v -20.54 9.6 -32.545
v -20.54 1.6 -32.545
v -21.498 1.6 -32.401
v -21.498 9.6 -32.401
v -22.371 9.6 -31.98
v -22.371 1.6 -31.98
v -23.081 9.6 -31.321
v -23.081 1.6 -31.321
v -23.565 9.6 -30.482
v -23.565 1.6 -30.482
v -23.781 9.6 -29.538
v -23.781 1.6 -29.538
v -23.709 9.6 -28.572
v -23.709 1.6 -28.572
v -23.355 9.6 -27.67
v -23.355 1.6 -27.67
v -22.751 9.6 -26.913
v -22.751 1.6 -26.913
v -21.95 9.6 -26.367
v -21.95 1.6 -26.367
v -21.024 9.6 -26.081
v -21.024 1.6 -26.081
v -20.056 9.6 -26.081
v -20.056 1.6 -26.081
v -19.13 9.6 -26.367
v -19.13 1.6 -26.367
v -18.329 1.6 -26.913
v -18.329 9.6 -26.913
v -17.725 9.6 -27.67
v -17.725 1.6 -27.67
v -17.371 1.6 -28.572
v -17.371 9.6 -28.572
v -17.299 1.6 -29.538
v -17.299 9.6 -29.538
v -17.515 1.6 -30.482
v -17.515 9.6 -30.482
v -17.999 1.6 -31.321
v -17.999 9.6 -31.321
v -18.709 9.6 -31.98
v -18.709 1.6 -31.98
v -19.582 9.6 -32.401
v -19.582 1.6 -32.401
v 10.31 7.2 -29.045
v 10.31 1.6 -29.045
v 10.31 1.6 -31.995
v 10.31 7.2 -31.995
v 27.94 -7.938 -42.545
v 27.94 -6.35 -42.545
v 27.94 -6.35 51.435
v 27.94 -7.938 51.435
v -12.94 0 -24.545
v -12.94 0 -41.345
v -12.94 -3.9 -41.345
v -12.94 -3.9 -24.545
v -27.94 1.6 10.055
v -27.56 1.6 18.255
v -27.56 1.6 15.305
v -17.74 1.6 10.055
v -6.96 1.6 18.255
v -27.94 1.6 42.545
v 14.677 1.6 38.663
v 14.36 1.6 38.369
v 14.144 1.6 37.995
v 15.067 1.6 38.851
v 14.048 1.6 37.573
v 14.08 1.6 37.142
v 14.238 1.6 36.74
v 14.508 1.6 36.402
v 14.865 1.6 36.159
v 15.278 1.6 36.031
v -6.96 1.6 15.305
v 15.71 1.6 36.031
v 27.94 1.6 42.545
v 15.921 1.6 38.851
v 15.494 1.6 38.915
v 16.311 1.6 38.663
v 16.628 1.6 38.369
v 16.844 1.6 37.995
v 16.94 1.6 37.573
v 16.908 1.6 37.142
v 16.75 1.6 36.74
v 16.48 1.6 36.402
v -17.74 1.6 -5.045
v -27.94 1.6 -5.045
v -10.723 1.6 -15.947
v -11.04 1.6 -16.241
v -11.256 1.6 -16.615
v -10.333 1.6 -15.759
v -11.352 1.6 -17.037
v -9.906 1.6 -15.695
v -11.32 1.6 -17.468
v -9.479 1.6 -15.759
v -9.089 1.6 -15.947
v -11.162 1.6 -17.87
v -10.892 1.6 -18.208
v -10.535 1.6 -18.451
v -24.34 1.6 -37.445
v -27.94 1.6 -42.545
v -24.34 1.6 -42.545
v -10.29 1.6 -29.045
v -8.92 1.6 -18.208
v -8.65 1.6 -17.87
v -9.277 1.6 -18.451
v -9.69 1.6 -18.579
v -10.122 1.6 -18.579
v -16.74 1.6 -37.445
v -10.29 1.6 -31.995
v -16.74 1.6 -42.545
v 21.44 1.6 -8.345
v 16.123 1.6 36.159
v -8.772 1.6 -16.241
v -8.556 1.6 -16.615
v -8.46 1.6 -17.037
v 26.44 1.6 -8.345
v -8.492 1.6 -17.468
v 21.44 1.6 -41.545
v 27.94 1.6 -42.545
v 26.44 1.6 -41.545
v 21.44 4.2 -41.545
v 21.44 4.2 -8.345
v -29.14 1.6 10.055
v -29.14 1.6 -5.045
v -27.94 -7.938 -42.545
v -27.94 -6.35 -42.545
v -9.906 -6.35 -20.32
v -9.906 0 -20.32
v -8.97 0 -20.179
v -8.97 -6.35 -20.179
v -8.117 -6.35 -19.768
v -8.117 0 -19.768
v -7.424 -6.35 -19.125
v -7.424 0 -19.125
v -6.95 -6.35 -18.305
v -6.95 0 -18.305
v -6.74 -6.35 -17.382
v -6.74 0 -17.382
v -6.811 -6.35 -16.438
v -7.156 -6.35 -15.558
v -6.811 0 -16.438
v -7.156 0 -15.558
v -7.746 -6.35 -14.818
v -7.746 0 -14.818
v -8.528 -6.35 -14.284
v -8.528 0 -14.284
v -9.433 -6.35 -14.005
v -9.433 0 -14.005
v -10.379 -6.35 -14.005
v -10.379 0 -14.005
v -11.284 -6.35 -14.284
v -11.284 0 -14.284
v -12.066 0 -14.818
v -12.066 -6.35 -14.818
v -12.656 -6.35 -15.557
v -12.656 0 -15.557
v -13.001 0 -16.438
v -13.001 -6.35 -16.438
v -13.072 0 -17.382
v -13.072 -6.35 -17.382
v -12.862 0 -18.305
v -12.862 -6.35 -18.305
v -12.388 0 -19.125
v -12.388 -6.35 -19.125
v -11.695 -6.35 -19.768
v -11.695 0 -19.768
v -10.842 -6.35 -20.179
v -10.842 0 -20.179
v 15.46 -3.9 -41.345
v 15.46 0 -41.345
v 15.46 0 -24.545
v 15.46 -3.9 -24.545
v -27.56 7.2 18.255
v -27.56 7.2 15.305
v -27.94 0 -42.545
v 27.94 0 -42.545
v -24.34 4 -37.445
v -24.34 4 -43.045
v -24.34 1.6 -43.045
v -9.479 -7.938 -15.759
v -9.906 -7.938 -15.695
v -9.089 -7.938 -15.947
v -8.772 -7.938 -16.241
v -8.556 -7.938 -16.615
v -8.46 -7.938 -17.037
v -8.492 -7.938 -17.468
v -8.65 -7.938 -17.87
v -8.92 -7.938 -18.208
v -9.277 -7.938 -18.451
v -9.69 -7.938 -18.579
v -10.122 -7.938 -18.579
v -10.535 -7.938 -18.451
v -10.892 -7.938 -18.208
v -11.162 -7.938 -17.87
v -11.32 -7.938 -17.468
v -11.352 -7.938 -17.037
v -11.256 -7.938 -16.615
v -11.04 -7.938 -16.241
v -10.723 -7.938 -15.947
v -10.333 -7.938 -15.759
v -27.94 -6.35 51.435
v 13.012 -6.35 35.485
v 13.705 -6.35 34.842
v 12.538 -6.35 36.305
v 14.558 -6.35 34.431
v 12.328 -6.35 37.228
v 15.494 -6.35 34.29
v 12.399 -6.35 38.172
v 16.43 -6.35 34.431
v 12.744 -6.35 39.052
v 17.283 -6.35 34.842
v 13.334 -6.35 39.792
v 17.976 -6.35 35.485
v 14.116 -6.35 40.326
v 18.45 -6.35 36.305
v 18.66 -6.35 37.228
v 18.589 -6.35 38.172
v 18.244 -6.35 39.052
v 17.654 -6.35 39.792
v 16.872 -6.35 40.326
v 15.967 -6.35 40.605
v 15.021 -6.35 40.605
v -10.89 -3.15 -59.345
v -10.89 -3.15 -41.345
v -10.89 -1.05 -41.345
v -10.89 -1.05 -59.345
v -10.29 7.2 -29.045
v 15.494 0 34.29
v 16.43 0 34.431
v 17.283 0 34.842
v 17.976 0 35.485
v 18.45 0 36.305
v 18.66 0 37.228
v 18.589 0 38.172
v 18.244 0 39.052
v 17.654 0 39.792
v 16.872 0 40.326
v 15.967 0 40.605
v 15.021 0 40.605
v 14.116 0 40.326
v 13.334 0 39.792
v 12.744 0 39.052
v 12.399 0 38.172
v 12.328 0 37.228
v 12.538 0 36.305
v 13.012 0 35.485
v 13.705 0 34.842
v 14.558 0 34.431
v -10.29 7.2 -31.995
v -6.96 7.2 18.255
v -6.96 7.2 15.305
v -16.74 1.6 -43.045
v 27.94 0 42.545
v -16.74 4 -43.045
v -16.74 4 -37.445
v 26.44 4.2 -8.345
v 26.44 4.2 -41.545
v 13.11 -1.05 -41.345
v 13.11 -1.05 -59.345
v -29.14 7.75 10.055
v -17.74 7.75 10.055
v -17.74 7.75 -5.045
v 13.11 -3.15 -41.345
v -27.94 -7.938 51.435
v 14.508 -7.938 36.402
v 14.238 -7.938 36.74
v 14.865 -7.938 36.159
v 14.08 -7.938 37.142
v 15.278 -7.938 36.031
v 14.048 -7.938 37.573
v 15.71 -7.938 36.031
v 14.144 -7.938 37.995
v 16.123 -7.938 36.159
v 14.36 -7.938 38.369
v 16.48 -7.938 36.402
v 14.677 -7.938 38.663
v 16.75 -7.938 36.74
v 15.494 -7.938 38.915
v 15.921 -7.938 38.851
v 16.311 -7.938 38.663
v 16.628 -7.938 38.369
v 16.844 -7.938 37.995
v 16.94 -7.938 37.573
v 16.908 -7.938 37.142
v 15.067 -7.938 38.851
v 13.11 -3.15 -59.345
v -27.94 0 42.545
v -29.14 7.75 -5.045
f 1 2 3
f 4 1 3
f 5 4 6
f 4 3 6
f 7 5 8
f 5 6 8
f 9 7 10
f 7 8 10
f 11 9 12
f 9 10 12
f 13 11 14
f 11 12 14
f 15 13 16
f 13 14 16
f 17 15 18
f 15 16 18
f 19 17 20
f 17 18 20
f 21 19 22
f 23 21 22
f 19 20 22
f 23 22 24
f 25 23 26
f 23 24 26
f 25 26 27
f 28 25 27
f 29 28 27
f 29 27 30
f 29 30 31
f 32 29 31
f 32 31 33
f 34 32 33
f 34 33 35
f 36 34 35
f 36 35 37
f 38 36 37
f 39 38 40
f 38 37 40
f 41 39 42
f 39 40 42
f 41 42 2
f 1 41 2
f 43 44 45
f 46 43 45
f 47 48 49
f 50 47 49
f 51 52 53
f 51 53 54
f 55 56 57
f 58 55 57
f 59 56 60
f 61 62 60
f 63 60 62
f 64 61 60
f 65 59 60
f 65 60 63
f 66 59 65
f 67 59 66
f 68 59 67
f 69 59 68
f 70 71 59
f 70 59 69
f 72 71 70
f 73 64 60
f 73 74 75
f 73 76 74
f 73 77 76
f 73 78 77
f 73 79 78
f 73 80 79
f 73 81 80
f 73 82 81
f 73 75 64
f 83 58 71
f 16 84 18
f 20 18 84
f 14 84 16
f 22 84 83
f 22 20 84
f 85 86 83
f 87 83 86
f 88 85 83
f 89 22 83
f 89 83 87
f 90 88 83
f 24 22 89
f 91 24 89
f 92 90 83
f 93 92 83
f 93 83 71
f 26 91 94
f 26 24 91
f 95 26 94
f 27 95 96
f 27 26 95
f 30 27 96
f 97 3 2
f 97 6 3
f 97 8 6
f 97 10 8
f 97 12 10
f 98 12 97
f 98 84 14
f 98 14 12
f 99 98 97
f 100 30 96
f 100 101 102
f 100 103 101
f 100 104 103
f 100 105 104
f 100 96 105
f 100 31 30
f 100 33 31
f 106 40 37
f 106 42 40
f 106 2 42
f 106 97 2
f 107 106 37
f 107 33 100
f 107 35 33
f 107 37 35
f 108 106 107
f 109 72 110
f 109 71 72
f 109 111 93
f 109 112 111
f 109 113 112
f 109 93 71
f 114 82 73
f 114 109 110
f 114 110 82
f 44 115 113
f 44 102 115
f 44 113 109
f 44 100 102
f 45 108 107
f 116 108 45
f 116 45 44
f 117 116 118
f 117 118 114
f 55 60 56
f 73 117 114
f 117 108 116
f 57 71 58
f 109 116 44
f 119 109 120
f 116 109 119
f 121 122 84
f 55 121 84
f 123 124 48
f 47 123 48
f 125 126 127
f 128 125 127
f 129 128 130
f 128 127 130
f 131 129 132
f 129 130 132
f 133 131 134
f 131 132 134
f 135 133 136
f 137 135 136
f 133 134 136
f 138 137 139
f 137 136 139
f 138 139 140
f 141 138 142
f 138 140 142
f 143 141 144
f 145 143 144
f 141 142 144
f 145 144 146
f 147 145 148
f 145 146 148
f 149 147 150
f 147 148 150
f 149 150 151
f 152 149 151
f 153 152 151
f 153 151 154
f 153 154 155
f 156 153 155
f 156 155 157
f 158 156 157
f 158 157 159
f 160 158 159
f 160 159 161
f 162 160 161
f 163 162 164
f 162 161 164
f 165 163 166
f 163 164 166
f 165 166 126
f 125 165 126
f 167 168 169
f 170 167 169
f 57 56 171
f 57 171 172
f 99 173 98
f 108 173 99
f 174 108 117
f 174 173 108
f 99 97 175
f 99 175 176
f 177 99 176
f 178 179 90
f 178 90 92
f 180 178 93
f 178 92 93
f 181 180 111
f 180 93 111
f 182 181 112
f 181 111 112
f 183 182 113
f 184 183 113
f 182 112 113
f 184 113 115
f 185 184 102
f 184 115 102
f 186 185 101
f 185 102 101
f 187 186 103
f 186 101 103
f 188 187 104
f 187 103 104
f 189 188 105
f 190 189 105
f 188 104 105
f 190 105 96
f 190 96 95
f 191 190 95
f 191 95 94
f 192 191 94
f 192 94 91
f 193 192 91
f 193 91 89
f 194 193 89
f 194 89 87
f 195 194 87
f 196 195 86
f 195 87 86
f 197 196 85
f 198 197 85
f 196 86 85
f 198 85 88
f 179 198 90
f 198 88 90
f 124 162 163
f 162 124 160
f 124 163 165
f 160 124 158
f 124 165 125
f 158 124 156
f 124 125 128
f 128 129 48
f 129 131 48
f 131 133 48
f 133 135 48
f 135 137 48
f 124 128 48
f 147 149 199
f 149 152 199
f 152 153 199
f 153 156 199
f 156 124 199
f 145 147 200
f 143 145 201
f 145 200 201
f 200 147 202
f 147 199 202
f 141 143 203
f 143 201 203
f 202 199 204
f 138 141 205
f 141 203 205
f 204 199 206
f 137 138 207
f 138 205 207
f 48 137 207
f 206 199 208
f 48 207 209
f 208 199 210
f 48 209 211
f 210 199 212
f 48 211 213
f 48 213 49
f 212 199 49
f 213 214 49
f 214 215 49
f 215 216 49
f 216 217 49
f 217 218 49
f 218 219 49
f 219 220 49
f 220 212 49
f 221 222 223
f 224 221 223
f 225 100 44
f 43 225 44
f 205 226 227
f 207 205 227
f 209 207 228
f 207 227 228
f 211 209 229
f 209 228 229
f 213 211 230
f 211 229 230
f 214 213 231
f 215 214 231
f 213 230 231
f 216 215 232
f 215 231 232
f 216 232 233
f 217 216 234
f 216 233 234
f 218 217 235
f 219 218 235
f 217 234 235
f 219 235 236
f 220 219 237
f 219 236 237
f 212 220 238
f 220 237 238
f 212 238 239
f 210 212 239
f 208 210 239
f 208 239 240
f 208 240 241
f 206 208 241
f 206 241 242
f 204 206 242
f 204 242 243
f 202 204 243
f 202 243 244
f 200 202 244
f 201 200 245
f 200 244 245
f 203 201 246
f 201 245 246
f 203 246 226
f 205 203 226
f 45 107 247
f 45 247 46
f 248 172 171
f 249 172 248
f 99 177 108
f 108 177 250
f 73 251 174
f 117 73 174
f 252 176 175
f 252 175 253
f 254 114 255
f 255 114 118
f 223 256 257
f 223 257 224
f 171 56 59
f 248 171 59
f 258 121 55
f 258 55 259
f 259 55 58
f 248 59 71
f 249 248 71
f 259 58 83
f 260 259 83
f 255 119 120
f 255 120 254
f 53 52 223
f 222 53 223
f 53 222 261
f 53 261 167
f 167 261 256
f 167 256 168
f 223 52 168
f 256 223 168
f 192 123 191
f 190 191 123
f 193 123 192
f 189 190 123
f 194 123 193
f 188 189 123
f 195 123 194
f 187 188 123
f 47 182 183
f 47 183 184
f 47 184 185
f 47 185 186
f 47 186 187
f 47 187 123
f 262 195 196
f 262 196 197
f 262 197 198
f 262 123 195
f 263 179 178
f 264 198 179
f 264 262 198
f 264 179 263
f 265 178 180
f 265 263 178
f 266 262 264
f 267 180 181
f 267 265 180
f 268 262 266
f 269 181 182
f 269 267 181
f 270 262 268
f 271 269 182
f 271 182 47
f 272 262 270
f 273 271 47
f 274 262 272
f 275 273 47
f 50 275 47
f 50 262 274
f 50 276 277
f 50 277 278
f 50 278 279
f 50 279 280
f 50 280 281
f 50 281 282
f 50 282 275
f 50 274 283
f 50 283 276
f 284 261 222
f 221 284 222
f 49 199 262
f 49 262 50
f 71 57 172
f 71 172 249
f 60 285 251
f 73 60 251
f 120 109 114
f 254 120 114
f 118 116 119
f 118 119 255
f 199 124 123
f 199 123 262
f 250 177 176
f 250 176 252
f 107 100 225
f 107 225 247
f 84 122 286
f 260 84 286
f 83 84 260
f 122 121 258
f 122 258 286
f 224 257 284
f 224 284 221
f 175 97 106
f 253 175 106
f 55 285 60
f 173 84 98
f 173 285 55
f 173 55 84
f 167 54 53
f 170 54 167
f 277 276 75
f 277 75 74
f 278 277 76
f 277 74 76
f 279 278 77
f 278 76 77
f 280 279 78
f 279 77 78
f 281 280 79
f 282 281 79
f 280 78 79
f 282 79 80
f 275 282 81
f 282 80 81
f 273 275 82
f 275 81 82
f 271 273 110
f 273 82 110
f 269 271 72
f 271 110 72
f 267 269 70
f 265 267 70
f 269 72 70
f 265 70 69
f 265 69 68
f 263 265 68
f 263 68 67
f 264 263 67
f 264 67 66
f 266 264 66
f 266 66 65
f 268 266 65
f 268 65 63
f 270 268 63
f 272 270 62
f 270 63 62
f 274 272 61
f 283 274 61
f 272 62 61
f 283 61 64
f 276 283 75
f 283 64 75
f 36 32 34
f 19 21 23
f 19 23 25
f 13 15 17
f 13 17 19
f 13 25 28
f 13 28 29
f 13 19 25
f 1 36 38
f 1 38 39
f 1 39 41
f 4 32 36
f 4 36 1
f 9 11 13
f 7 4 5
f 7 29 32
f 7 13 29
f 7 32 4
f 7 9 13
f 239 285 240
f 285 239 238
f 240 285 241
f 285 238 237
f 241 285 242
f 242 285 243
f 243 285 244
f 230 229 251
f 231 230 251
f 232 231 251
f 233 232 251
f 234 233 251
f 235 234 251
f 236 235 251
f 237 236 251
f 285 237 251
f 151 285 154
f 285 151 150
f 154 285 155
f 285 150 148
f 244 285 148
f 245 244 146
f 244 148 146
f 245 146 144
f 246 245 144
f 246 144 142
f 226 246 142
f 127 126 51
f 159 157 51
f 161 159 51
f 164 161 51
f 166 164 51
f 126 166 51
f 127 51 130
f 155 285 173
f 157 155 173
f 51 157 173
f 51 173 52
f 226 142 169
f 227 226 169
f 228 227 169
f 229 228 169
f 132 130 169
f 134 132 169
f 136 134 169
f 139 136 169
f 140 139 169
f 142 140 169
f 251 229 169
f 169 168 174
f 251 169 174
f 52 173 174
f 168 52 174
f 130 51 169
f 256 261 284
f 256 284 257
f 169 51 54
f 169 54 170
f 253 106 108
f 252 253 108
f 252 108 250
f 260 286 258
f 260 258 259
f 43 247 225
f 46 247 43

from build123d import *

# Parameters (mm, degrees)
SKETCH2_W               = 55.88
SKETCH2_H               = 85.09
FIBERGLASS_PCB_DEPTH    = 1.6
SKETCH3_W               = 7.6
SKETCH3_H               = 5.6
USB_MICRO_B_POWER_DEPTH = 2.4
SKETCH4_W               = 5
SKETCH4_H               = 33.2
BOSS_EXTRUDE3_DEPTH     = 2.6
SKETCH5_W               = 11.4
SKETCH5_H               = 15.1
BOSS_EXTRUDE4_DEPTH     = 6.15
SKETCH6_W               = 20.6
SKETCH6_H               = 2.95
BOSS_EXTRUDE5_DEPTH     = 5.6
SKETCH8_R               = 3.25
BOSS_EXTRUDE6_DEPTH     = 8
SKETCH9_W               = 28.4
SKETCH9_H               = 16.8
BOSS_EXTRUDE7_DEPTH     = 3.9
SKETCH10_W              = 24
SKETCH10_H              = 2.1
BOSS_EXTRUDE8_DEPTH     = 18
SKETCH11_R              = 1.45
CUT_EXTRUDE1_DEPTH      = 67.5955601
SKETCH12_R              = 3.175
BOSS_EXTRUDE9_DEPTH     = 6.35
SKETCH13_W              = 55.88
SKETCH13_H              = 93.98
BOSS_EXTRUDE10_DEPTH    = 1.5875
SKETCH14_R              = 1.45
CUT_EXTRUDE2_DEPTH      = 67.797698548


with BuildPart() as part:
    # Sketch2 → Fiberglass PCB (new body)
    with BuildSketch(Plane(origin=(0, 0, 0), x_dir=(1, 0, 0), z_dir=(0, 1, 0))):
        Rectangle(SKETCH2_W, SKETCH2_H)
    extrude(amount=FIBERGLASS_PCB_DEPTH)

    # Sketch3 → USB Micro-B Power (add)
    with BuildSketch(Plane(origin=(0, 1.6, 0), x_dir=(1, 0, 0), z_dir=(0, 1, 0))):
        with Locations((-20.54, 40.245)):
            Rectangle(SKETCH3_W, SKETCH3_H)
    extrude(amount=USB_MICRO_B_POWER_DEPTH)

    # Sketch4 → Boss-Extrude3 (add)
    with BuildSketch(Plane(origin=(0, 1.6, 0), x_dir=(1, 0, 0), z_dir=(0, 1, 0))):
        with Locations((23.94, 24.945)):
            Rectangle(SKETCH4_W, SKETCH4_H)
    extrude(amount=BOSS_EXTRUDE3_DEPTH)

    # Sketch5 → Boss-Extrude4 (add)
    with BuildSketch(Plane(origin=(0, 1.6, 0), x_dir=(1, 0, 0), z_dir=(0, 1, 0))):
        with Locations((-23.44, -2.505)):
            Rectangle(SKETCH5_W, SKETCH5_H)
    extrude(amount=BOSS_EXTRUDE4_DEPTH)

    # Sketch6 → Boss-Extrude5 (add)
    with BuildSketch(Plane(origin=(0, 1.6, 0), x_dir=(1, 0, 0), z_dir=(0, 1, 0))):
        with Locations((0.01, 30.52)):
            Rectangle(SKETCH6_W, SKETCH6_H)
        with Locations((-17.26, -16.78)):
            Rectangle(SKETCH6_W, SKETCH6_H)
    extrude(amount=BOSS_EXTRUDE5_DEPTH)

    # Sketch8 → Boss-Extrude6 (add)
    with BuildSketch(Plane(origin=(0, 1.6, 0), x_dir=(1, 0, 0), z_dir=(0, 1, 0))):
        with Locations(Location((-20.54, 29.295, 0), (0, 0, 90))):
            Circle(SKETCH8_R)
    extrude(amount=BOSS_EXTRUDE6_DEPTH)

    # Sketch9 → Boss-Extrude7 (add)
    with BuildSketch(Plane.XZ):
        with Locations((1.26, -32.945)):
            Rectangle(SKETCH9_W, SKETCH9_H)
    extrude(amount=BOSS_EXTRUDE7_DEPTH)

    # Sketch10 → Boss-Extrude8 (add)
    with BuildSketch(Plane(origin=(0, 0, -41.345), x_dir=(-1, 0, 0), z_dir=(0, 0, -1))):
        with Locations((-1.11, -2.1)):
            Rectangle(SKETCH10_W, SKETCH10_H)
    extrude(amount=BOSS_EXTRUDE8_DEPTH)

    # Sketch11 → Cut-Extrude1 (cut, through all)
    with BuildSketch(Plane(origin=(0, 1.6, 0), x_dir=(1, 0, 0), z_dir=(0, 1, 0))):
        with Locations(Location((15.494, -37.465, 0), (0, 0, 270))):
            Circle(SKETCH11_R)
        with Locations(Location((-9.906, 17.145, 0), (0, 0, 270))):
            Circle(SKETCH11_R)
    extrude(amount=-CUT_EXTRUDE1_DEPTH, mode=Mode.SUBTRACT)

    # Sketch12 → Boss-Extrude9 (add)
    with BuildSketch(Plane.XZ):
        with Locations(Location((-9.906, -17.145, 0), (0, 0, 270))):
            Circle(SKETCH12_R)
        with Locations(Location((15.494, 37.465, 0), (0, 0, 270))):
            Circle(SKETCH12_R)
    extrude(amount=BOSS_EXTRUDE9_DEPTH)

    # Sketch13 → Boss-Extrude10 (add)
    with BuildSketch(Plane.XZ.offset(6.35)):
        with Locations((0, 4.445)):
            Rectangle(SKETCH13_W, SKETCH13_H)
    extrude(amount=BOSS_EXTRUDE10_DEPTH)

    # Sketch14 → Cut-Extrude2 (cut, through all)
    with BuildSketch(Plane(origin=(0, 1.6, 0), x_dir=(1, 0, 0), z_dir=(0, 1, 0))):
        with Locations(Location((-9.906, 17.145, 0), (0, 0, 270))):
            Circle(SKETCH14_R)
        with Locations(Location((15.494, -37.465, 0), (0, 0, 270))):
            Circle(SKETCH14_R)
    extrude(amount=-CUT_EXTRUDE2_DEPTH, mode=Mode.SUBTRACT)


solid = part.part
